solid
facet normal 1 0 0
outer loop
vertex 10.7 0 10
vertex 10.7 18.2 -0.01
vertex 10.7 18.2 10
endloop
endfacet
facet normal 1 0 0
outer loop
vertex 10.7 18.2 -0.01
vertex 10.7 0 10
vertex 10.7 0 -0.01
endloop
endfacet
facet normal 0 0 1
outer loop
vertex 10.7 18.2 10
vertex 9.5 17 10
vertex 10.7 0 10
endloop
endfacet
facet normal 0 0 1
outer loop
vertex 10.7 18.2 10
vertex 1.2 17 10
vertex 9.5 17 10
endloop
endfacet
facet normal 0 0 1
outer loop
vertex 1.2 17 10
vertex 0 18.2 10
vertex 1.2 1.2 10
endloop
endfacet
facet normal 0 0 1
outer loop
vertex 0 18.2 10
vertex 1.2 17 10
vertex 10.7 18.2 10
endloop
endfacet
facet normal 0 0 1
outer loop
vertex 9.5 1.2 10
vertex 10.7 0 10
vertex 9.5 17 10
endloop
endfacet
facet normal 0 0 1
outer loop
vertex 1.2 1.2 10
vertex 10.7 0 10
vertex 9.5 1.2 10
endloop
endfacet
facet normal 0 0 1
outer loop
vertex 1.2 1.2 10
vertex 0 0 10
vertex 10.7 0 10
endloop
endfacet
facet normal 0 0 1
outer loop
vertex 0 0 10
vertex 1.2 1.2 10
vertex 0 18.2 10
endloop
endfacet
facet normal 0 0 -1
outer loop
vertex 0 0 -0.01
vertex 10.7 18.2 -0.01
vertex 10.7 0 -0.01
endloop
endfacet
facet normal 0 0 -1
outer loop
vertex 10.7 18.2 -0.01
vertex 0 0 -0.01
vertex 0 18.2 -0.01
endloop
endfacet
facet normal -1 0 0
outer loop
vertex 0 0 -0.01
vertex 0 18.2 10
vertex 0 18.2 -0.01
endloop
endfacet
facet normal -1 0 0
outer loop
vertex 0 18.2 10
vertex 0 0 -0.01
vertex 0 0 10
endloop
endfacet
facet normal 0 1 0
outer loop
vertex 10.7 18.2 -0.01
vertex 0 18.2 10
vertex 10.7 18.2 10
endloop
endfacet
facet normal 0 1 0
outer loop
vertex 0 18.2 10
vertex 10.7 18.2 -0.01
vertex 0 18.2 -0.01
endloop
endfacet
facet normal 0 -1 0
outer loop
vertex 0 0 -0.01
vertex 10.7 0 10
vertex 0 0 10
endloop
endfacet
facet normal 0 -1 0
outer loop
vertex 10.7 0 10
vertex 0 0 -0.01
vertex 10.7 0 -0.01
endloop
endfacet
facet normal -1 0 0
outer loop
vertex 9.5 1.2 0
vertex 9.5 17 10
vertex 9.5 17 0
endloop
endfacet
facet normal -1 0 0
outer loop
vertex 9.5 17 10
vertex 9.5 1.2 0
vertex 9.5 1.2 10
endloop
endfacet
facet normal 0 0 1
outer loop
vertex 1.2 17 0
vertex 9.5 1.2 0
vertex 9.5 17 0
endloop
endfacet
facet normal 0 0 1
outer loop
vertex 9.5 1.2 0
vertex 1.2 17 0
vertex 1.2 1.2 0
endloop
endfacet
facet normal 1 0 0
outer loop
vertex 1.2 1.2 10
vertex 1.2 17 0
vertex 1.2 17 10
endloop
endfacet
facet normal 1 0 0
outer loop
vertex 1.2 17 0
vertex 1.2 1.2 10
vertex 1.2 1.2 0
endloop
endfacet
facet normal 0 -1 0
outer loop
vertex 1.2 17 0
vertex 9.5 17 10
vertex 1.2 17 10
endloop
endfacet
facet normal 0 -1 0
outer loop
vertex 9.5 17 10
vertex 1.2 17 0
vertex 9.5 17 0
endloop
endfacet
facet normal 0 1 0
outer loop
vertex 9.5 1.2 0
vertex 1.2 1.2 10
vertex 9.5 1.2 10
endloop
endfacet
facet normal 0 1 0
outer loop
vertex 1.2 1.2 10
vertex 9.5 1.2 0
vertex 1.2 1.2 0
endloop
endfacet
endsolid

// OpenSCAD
// file: ../Base/Rotation.scad
// Fischertechnik Box Foundation
// Geometry Helpers Rotation

include <PlacementOptions.scad>

// getRotatedSpace(space, rotation=NoRotation)
// Rotates the space dependent on the specified rotation

function getRotatedSpace(space, rotation=NoRotation) = [
    (rotation == Rotate90 || rotation == Rotate270) ? space.y : space.x,
    (rotation == Rotate90 || rotation == Rotate270) ? space.x : space.y
];

// Rotates the given space around the fixed left lower corner
// space = the space the children needs as width/depth list [width,depth]
// rotation = 0 Rotate0 degrees, 1 Rotate90 degrees, 2 Rotate180 degrees, 3 Rotate270 degrees (equivalent to -90)

module RotateFix(space, rotation=NoRotation) {
    dy = (rotation == Rotate0 || rotation == Rotate270) ? 0 :
        (rotation == Rotate90) ? space.x :
        space.y;
    dx = (rotation < Rotate180) ? 0 :
        (rotation == Rotate180) ? space.x :
        space.y;
    
    translate([dx, dy, 0])
        rotate([0, 0, rotations[rotation]])
            children();
}
// file: ../Base/Alignment.scad
// Fischertechnik Box Foundation
// Geometry Helpers Alignment

include <PlacementOptions.scad>

// getAlignedX(elementWidth, spaceWidth, align=AlignRight, offset=0)
// Gets the aligned X offset of an element with the given
// width in the given space.
// elementWidth = The width of the element to positon
// spaceWidth = The space where the element should be aligned
// align = 0 AlignLeft, 1 AlignCenter, 2 AlignRight
// offset = an optional offset from the aligned position. When
// aligned left or centered, then positive values are in X direction.
// When aligned right then positive values are in negative X direction.

function getAlignedX(elementWidth, spaceWidth, align=AlignRight, offset=0) =
    (align == AlignLeft) ?
        offset :
        ((align == AlignCenter) ?
        (spaceWidth - elementWidth)/2 + offset :
        spaceWidth - offset - elementWidth);

// getAlignedY(elementDepth, spaceDepth, align=AlignTop, offset=0)
// Gets the aligned Y offset of an element with the given
// depth in the given space.
// elementDepth = The depth of the element to positon
// spaceDepth = The space where the element should be aligned
// align = 0 AlignBottom, 1 AlignCenter, 2 AlignTop
// offset = an optional offset from the aligned position. When
// aligned bottom or centered, then positive values are in Y direction.
// When aligned top then positive values are in negative Y direction.

function getAlignedY(elementDepth, spaceDepth, align=AlignTop, offset=0) =
    (align == AlignBottom) ?
        offset :
        ((align == AlignCenter) ?
        (spaceDepth - elementDepth)/2 + offset :
        spaceDepth - offset - elementDepth);
// file: ../Base/PlacementOptions.scad
// Fischertechnik Box Foundation
// Placement Options

// Alignment
NoAlign = 0;
AlignLeft = 1;
AlignBottom = 2;
AlignCenter = 3;
AlignRight = 4;
AlignTop = 5;

// Element rotation degree steps
rotations = [0, -90, -180, -270];

// Rotation
NoRotation = 0;
Rotate0 = 0;
Rotate90 = 1;
Rotate180 = 2;
Rotate270 = 3;

// Docking (seen from above)
NoDock = -1;
DockLeft = 0;
DockTop = 1;
DockRight = 2;
DockCorner = 2;
DockBottom = 3;

// Web corners
LowerLeft = 0;
UpperLeft = 1;
UpperRight = 2;
LowerRight = 3;

// Web position relative to corner
LeftOfCorner = 0;
RightOfCorner = 1;
// file: ../Base/Boxes.scad
// Fischertechnik Box Foundation
// Pre-designed Boxes

use <Constants.scad>

include <PlacementOptions.scad>

box190Width = 190;
box190Depth = 130;
box130Width = 130;
box130Depth = 95;

// Values are from an original ec3 box
topBottomDifference = 1.5;
outerHeight = 40;
innerHeight = 38.2;
baseThickness = outerHeight - innerHeight;
stackExcess = 5.7;
radius = 3.5;
wallThickness = 1.5;
tolerance = 0.2;
stackOffset = innerHeight - stackExcess;

boxUsageHeight = stackOffset;
boxWallThickness = wallThickness;
boxBaseThickness = baseThickness;
boxWebWidth = 3.0;

// getBoxWallThickness()
// Gets the wall thickness of a Fischertechnik Box
function getBoxWallThickness() = boxWallThickness;

// getBoxUsageHeight()
// Gets the usable height of a Fischertechnik box
function getBoxUsageHeight() = boxUsageHeight;

// getBoxInnerHeight()
// Gets the inner height of a Fischertechnik box, including the stack excess
function getBoxInnerHeight() = innerHeight;

// getBoxBaseThickness()
// Gets the thickness of the Fischertechnik box base.
function getBoxBaseThickness() = boxBaseThickness;

// getBoxWebWidth()
// Gets the width of a box web
function getBoxWebWidth() = boxWebWidth;

// getBox190Space()
// Gets the usable inner space of a Box 190 as an x/y-list
function getBox190Space() = [
    box190Width - 2*getBoxWallThickness() - topBottomDifference, 
    box190Depth - 2*getBoxWallThickness() - topBottomDifference ];

// BoxBase(width, depth)
// Creates an empty stackable Fischertechnik compatible box
// width = Outer width of the box (190, 130, ...)
// depth = Outer depth of the box (130, 95, ...)

module BoxBase(width, depth, height=outerHeight) {    
    thinPlate = 0.01;

    innerHeight = height - baseThickness;    
    
    module BodyPlate(width, depth) {
        translate([radius, radius])
        hull() {
            w = width-2*radius;
            d = depth-2*radius;
            cube([w, d, thinPlate]);
            cylinder(thinPlate, r=radius, $fn=getFragments());
            translate([w, 0])
                cylinder(thinPlate, r=radius, $fn=getFragments());
            translate([w, d])
                cylinder(thinPlate, r=radius, $fn=getFragments());
            translate([0, d])
                cylinder(thinPlate, r=radius, $fn=getFragments());
        }
    }
    
    module Body(tolerance=tolerance) {
        hull() {
            // Bottom with tolerance to fit into the original boxes when stacked
            translate([-wallThickness+tolerance, -wallThickness+tolerance, -baseThickness])
                BodyPlate(width-topBottomDifference-2*tolerance, depth-topBottomDifference-2*tolerance);
            
            // Top
            translate([-wallThickness-topBottomDifference/2, -wallThickness-topBottomDifference/2, innerHeight-thinPlate])
                BodyPlate(width, depth);
         }
    }

    module Cutoff() {
        hull() {
            coWidth = width - 2*wallThickness;
            coDepth = depth - 2*wallThickness;
            
            // Bottom
            BodyPlate(coWidth-topBottomDifference, coDepth-topBottomDifference);

            // Top
            translate([-topBottomDifference/2, -topBottomDifference/2, innerHeight+thinPlate]) 
                BodyPlate(coWidth, coDepth);
        }
    }
    
    difference() {        
        Body();
        Cutoff();
        stackOffset = innerHeight - stackExcess;
        translate([0, 0, stackOffset + baseThickness])
            Body(tolerance=0);
    }
}

// Creates the Fischertechnik empty box 130x190 mm and places it at position 0,0
// 190x130 are the outer sizes, the inner space is slightly smaller. Use getBox190Space() to get the inner sizes.
// The box is positioned that the usable inner space is at the 0,0,0 position. The

module Box190() {
    BoxBase(box190Width, box190Depth);
}

// Gets the usable inner space of a Box 130 as an x/y-list
function getBox130Space() = [
    box130Width - 2*getBoxWallThickness() - topBottomDifference, 
    box130Depth - 2*getBoxWallThickness() - topBottomDifference ];

// Creates the Fischertechnik empty box 95x130 mm and places it at position 0,0
// 190x130 are the outer sizes, the inner space is slightly smaller. Use getBox190Space() to get the inner sizes.
// The box is positioned that the usable inner space is at the 0,0,0 position. The

module Box130() {
    BoxBase(box130Width, box130Depth);
}

// Creates a web at the specified box walls
// corner 0 = LowerLeft, 1 = UpperLeft, 2 = UpperRight, 3 = LowerRight
// side 0 = LeftOfCorner, 1 = RightOfCorner
// distance = Distance in mm from the corner
// boxSpace = inner width and depth of the box (default: Box 190)
// webWidth = length of the web (default is 3 mms)
// webThickness = thickness of the web (default is 1 mm)

module BoxWeb(corner, side, distance, boxSpace=getBox190Space(), webWidth=getBoxWebWidth(), webThickness=1.0) {
    sink = getBoxWallThickness()/2;

    width = (corner % 2 == 0) ? 
            (side == LeftOfCorner ? webWidth : webThickness) :
            (side == LeftOfCorner ? webThickness : webWidth);

    depth = (corner % 2 == 0) ? 
            (side == RightOfCorner ? webWidth : webThickness) :
            (side == RightOfCorner ? webThickness : webWidth);
    
    xDiff = corner == LowerLeft ? 
                (side == LeftOfCorner ? -sink : distance) :
            (corner == UpperLeft ?                
                (side == LeftOfCorner ? distance : -sink) :
            (corner == UpperRight ?
                (side == LeftOfCorner ? boxSpace.x-webWidth+sink : boxSpace.x-distance-webThickness) :
                (side == LeftOfCorner ? boxSpace.x-distance-webThickness: boxSpace.x-webWidth+sink)));

    yDiff = corner == LowerLeft ? 
                (side == RightOfCorner ? -sink : distance) :
            (corner == UpperLeft ?
                (side == RightOfCorner ? boxSpace.y-distance : boxSpace.y-webWidth+sink) :
            (corner == UpperRight ?
                (side == RightOfCorner ? boxSpace.y-webWidth+sink : boxSpace.y-distance) :
                (side == RightOfCorner ? distance : -sink)));
    
    translate([xDiff, yDiff, -getExcess()])
        cube([width, depth, boxUsageHeight + 2*getExcess()]);
}
// file: ../Base/Placement.scad
// Fischertechnik Box Foundation
// Geometry Helpers Placement

use <Constants.scad>
use <Alignment.scad>
use <Rotation.scad>
use <Boxes.scad>

include <PlacementOptions.scad>

// Place(x=0, y=0, elementSpace=[0,0], alignX=AlignLeft, alignY=AlignBottom, rotation=Rotate0, boxSpace=getBox190Space())
// Places the child at the specified position
// y = Y-Position. This is a relative position when an X aligment is specified.
// x = X-Position. This is a relative position when an Y aligment is specified.
// elementSpace = space of the element to be placed [x,y]
// alignX = -1=NoAlign, 0 AlignLeft, 1 AlignCenter, 3 AlignRight (elementSpace and boxSpace required!)
// alignY = -1=NoAlign, 2 AlignBottom, 1 AlignCenter, 4 AlignTop (elementSpace and boxSpace required!)
// rotation = 0 Rotate0 0 degrees, 1 Rotate90 90 degrees, 
// 2 Rotate180 180 degrees, 3 Rotate270 270 degrees (equivalent to -90)
// boxSpace = Inner space of the box where the placement occurs [x,y] - default is Box 190x130 inner space

module Place(x=0, y=0, elementSpace=[0,0], 
  alignX=AlignLeft, alignY=AlignBottom, 
  rotation=NoRotation, boxSpace=getBox190Space()) {

    module Position(x, y, space, rotation=Rotate0) {
        translate([x, y, 0])
            RotateFix(space, rotation)
                children();
    }

    space = getRotatedSpace(elementSpace, rotation);
    alignedX = getAlignedX(space.x, boxSpace.x, alignX, x);
    alignedY = getAlignedY(space.y, boxSpace.y, alignY, y);
    Position(alignedX, alignedY, elementSpace, rotation)
        children();
}

// Center(space=getBox130Space(), elementSpace=[0,0])
// space = Space where the children is centered. For cylinder use centered=true and no elementSpace.
// elementSpace = space of the element to be centered [x,y]

module Center(space=getBox190Space(), elementSpace=[0,0]) {
    Place(elementSpace=elementSpace, boxSpace=space, alignX=AlignCenter, alignY=AlignCenter)
        children();
}

// CenterHorizontal(width=0, y=0, offset=0, space=getBox130Space())
// width = Width of the element to be placed.
// y = Y position of the element
// offset = Offset from the center position (negative will be left of the center)
// space = Space where the element is placed

module CenterHorizontal(width=0, y=0, offset=0, space=getBox190Space()) {
    Place(x=offset, y=y, elementSpace=[width, 0], boxSpace=space, alignX=AlignCenter)
        children(0);
}

// CenterVertical(depth=0, x=0, offset=0, space=getBox130Space())
// depth = Depth of the element to be placed.
// x = X position of the element
// offset = Offset from the center position (negative will be down of the center)
// space = Space where the element is placed

module CenterVertical(depth=0, x=0, offset=0, space=getBox190Space()) {
    Place(x=x, y=offset, elementSpace=[0, depth], boxSpace=space, alignY=AlignCenter)
        children(0);
}

// getIsVertical(align)
// True if the specified alignment needs a vertical orientation for a divider (AlignRight, AlignLeft)

function getIsVertical(align) = (align == AlignRight || align == AlignLeft);

// getIsHorizontal(align)
// True if the specified alignment needs a horizontal orientation for a divider (AlignTop, AlignBottom)

function getIsHorizontal(align) = (align == AlignTop || align == AlignBottom);
// file: ../Base/Constants.scad
// Fischertechnik Box Foundation
// Constants

// Constant values necessary for multiple elements

// Base constants
dividerThickness = 1.2;
excess = 0.01;
fragments = 90;
tolerance = 0.8;

// Gets the thickness of a divider 
function getDividerThickness() = dividerThickness;

// Gets the excess that is used to merge walls into each other
function getExcess() = excess;

// Gets amount of fragments of a cylinder
function getFragments() = fragments;

// Gets the inner tolerance of a frame to each side
function getTolerance() = tolerance;


// Fischertechnik specific constants
axisDiameter = 4;
axisBottomDiameter = axisDiameter + 1;
standardEdgeDistance = 2.5;
standardWebDistance = 11.5;
standardCornerLength = 15;
tubeWallFactor = 0.8;
smallPartsFrameHeight = 20;

// Gets axis diameter
function getAxisDiameter() = axisDiameter;

// Gets axis bottom diameter for thicker part at the bottom
function getAxisBottomDiameter() = axisBottomDiameter;

// gets the standard distance to the wall of the box for dockable frames with webs
function getStandardEdgeDistance() = standardEdgeDistance;

// gets the standard distance of each web to the corner of the dockable frame
function getStandardWebDistance() = standardWebDistance;

// gets the standard length of the corner walls of a dockable frame
function getStandardCornerLength() = standardCornerLength;

// gets the wall thickness of a tube.
function getTubeWallThickness() = tubeWallFactor * getDividerThickness();

// gets the frame height for docked small parts boxes.
function getSmallPartsFrameHeight() = smallPartsFrameHeight;
// main file
// Fischertechnik Box Library
// Frame for small blocks 5 or 7.5 mm
// 37237 and 37238

use <../ModelBase/Simple.scad>

/* [Element Parameters] */
columns = 1;
rows = 1;

/* [Hidden] */
width = 7.5;
depth = 15;
height = 10;

// getFrameSmallBlockSpace(columns=1, rows=1)
// Gets the space of a frame for columns x rows small parts (7.5 or 5)

function getFrameSmallBlockSpace(columns=1, rows=1) = getFrameOuterVolume([width * columns, depth * rows, height]);

// FrameSmallBlock(columns=1, rows=1)
// frame for columns x rows small parts (7.5 or 5)

module FrameSmallBlock(columns=1, rows=1) {
    Frame([width * columns, depth * rows, height]);
}

// Tests
color("lightgray")
FrameSmallBlock(columns, rows);
